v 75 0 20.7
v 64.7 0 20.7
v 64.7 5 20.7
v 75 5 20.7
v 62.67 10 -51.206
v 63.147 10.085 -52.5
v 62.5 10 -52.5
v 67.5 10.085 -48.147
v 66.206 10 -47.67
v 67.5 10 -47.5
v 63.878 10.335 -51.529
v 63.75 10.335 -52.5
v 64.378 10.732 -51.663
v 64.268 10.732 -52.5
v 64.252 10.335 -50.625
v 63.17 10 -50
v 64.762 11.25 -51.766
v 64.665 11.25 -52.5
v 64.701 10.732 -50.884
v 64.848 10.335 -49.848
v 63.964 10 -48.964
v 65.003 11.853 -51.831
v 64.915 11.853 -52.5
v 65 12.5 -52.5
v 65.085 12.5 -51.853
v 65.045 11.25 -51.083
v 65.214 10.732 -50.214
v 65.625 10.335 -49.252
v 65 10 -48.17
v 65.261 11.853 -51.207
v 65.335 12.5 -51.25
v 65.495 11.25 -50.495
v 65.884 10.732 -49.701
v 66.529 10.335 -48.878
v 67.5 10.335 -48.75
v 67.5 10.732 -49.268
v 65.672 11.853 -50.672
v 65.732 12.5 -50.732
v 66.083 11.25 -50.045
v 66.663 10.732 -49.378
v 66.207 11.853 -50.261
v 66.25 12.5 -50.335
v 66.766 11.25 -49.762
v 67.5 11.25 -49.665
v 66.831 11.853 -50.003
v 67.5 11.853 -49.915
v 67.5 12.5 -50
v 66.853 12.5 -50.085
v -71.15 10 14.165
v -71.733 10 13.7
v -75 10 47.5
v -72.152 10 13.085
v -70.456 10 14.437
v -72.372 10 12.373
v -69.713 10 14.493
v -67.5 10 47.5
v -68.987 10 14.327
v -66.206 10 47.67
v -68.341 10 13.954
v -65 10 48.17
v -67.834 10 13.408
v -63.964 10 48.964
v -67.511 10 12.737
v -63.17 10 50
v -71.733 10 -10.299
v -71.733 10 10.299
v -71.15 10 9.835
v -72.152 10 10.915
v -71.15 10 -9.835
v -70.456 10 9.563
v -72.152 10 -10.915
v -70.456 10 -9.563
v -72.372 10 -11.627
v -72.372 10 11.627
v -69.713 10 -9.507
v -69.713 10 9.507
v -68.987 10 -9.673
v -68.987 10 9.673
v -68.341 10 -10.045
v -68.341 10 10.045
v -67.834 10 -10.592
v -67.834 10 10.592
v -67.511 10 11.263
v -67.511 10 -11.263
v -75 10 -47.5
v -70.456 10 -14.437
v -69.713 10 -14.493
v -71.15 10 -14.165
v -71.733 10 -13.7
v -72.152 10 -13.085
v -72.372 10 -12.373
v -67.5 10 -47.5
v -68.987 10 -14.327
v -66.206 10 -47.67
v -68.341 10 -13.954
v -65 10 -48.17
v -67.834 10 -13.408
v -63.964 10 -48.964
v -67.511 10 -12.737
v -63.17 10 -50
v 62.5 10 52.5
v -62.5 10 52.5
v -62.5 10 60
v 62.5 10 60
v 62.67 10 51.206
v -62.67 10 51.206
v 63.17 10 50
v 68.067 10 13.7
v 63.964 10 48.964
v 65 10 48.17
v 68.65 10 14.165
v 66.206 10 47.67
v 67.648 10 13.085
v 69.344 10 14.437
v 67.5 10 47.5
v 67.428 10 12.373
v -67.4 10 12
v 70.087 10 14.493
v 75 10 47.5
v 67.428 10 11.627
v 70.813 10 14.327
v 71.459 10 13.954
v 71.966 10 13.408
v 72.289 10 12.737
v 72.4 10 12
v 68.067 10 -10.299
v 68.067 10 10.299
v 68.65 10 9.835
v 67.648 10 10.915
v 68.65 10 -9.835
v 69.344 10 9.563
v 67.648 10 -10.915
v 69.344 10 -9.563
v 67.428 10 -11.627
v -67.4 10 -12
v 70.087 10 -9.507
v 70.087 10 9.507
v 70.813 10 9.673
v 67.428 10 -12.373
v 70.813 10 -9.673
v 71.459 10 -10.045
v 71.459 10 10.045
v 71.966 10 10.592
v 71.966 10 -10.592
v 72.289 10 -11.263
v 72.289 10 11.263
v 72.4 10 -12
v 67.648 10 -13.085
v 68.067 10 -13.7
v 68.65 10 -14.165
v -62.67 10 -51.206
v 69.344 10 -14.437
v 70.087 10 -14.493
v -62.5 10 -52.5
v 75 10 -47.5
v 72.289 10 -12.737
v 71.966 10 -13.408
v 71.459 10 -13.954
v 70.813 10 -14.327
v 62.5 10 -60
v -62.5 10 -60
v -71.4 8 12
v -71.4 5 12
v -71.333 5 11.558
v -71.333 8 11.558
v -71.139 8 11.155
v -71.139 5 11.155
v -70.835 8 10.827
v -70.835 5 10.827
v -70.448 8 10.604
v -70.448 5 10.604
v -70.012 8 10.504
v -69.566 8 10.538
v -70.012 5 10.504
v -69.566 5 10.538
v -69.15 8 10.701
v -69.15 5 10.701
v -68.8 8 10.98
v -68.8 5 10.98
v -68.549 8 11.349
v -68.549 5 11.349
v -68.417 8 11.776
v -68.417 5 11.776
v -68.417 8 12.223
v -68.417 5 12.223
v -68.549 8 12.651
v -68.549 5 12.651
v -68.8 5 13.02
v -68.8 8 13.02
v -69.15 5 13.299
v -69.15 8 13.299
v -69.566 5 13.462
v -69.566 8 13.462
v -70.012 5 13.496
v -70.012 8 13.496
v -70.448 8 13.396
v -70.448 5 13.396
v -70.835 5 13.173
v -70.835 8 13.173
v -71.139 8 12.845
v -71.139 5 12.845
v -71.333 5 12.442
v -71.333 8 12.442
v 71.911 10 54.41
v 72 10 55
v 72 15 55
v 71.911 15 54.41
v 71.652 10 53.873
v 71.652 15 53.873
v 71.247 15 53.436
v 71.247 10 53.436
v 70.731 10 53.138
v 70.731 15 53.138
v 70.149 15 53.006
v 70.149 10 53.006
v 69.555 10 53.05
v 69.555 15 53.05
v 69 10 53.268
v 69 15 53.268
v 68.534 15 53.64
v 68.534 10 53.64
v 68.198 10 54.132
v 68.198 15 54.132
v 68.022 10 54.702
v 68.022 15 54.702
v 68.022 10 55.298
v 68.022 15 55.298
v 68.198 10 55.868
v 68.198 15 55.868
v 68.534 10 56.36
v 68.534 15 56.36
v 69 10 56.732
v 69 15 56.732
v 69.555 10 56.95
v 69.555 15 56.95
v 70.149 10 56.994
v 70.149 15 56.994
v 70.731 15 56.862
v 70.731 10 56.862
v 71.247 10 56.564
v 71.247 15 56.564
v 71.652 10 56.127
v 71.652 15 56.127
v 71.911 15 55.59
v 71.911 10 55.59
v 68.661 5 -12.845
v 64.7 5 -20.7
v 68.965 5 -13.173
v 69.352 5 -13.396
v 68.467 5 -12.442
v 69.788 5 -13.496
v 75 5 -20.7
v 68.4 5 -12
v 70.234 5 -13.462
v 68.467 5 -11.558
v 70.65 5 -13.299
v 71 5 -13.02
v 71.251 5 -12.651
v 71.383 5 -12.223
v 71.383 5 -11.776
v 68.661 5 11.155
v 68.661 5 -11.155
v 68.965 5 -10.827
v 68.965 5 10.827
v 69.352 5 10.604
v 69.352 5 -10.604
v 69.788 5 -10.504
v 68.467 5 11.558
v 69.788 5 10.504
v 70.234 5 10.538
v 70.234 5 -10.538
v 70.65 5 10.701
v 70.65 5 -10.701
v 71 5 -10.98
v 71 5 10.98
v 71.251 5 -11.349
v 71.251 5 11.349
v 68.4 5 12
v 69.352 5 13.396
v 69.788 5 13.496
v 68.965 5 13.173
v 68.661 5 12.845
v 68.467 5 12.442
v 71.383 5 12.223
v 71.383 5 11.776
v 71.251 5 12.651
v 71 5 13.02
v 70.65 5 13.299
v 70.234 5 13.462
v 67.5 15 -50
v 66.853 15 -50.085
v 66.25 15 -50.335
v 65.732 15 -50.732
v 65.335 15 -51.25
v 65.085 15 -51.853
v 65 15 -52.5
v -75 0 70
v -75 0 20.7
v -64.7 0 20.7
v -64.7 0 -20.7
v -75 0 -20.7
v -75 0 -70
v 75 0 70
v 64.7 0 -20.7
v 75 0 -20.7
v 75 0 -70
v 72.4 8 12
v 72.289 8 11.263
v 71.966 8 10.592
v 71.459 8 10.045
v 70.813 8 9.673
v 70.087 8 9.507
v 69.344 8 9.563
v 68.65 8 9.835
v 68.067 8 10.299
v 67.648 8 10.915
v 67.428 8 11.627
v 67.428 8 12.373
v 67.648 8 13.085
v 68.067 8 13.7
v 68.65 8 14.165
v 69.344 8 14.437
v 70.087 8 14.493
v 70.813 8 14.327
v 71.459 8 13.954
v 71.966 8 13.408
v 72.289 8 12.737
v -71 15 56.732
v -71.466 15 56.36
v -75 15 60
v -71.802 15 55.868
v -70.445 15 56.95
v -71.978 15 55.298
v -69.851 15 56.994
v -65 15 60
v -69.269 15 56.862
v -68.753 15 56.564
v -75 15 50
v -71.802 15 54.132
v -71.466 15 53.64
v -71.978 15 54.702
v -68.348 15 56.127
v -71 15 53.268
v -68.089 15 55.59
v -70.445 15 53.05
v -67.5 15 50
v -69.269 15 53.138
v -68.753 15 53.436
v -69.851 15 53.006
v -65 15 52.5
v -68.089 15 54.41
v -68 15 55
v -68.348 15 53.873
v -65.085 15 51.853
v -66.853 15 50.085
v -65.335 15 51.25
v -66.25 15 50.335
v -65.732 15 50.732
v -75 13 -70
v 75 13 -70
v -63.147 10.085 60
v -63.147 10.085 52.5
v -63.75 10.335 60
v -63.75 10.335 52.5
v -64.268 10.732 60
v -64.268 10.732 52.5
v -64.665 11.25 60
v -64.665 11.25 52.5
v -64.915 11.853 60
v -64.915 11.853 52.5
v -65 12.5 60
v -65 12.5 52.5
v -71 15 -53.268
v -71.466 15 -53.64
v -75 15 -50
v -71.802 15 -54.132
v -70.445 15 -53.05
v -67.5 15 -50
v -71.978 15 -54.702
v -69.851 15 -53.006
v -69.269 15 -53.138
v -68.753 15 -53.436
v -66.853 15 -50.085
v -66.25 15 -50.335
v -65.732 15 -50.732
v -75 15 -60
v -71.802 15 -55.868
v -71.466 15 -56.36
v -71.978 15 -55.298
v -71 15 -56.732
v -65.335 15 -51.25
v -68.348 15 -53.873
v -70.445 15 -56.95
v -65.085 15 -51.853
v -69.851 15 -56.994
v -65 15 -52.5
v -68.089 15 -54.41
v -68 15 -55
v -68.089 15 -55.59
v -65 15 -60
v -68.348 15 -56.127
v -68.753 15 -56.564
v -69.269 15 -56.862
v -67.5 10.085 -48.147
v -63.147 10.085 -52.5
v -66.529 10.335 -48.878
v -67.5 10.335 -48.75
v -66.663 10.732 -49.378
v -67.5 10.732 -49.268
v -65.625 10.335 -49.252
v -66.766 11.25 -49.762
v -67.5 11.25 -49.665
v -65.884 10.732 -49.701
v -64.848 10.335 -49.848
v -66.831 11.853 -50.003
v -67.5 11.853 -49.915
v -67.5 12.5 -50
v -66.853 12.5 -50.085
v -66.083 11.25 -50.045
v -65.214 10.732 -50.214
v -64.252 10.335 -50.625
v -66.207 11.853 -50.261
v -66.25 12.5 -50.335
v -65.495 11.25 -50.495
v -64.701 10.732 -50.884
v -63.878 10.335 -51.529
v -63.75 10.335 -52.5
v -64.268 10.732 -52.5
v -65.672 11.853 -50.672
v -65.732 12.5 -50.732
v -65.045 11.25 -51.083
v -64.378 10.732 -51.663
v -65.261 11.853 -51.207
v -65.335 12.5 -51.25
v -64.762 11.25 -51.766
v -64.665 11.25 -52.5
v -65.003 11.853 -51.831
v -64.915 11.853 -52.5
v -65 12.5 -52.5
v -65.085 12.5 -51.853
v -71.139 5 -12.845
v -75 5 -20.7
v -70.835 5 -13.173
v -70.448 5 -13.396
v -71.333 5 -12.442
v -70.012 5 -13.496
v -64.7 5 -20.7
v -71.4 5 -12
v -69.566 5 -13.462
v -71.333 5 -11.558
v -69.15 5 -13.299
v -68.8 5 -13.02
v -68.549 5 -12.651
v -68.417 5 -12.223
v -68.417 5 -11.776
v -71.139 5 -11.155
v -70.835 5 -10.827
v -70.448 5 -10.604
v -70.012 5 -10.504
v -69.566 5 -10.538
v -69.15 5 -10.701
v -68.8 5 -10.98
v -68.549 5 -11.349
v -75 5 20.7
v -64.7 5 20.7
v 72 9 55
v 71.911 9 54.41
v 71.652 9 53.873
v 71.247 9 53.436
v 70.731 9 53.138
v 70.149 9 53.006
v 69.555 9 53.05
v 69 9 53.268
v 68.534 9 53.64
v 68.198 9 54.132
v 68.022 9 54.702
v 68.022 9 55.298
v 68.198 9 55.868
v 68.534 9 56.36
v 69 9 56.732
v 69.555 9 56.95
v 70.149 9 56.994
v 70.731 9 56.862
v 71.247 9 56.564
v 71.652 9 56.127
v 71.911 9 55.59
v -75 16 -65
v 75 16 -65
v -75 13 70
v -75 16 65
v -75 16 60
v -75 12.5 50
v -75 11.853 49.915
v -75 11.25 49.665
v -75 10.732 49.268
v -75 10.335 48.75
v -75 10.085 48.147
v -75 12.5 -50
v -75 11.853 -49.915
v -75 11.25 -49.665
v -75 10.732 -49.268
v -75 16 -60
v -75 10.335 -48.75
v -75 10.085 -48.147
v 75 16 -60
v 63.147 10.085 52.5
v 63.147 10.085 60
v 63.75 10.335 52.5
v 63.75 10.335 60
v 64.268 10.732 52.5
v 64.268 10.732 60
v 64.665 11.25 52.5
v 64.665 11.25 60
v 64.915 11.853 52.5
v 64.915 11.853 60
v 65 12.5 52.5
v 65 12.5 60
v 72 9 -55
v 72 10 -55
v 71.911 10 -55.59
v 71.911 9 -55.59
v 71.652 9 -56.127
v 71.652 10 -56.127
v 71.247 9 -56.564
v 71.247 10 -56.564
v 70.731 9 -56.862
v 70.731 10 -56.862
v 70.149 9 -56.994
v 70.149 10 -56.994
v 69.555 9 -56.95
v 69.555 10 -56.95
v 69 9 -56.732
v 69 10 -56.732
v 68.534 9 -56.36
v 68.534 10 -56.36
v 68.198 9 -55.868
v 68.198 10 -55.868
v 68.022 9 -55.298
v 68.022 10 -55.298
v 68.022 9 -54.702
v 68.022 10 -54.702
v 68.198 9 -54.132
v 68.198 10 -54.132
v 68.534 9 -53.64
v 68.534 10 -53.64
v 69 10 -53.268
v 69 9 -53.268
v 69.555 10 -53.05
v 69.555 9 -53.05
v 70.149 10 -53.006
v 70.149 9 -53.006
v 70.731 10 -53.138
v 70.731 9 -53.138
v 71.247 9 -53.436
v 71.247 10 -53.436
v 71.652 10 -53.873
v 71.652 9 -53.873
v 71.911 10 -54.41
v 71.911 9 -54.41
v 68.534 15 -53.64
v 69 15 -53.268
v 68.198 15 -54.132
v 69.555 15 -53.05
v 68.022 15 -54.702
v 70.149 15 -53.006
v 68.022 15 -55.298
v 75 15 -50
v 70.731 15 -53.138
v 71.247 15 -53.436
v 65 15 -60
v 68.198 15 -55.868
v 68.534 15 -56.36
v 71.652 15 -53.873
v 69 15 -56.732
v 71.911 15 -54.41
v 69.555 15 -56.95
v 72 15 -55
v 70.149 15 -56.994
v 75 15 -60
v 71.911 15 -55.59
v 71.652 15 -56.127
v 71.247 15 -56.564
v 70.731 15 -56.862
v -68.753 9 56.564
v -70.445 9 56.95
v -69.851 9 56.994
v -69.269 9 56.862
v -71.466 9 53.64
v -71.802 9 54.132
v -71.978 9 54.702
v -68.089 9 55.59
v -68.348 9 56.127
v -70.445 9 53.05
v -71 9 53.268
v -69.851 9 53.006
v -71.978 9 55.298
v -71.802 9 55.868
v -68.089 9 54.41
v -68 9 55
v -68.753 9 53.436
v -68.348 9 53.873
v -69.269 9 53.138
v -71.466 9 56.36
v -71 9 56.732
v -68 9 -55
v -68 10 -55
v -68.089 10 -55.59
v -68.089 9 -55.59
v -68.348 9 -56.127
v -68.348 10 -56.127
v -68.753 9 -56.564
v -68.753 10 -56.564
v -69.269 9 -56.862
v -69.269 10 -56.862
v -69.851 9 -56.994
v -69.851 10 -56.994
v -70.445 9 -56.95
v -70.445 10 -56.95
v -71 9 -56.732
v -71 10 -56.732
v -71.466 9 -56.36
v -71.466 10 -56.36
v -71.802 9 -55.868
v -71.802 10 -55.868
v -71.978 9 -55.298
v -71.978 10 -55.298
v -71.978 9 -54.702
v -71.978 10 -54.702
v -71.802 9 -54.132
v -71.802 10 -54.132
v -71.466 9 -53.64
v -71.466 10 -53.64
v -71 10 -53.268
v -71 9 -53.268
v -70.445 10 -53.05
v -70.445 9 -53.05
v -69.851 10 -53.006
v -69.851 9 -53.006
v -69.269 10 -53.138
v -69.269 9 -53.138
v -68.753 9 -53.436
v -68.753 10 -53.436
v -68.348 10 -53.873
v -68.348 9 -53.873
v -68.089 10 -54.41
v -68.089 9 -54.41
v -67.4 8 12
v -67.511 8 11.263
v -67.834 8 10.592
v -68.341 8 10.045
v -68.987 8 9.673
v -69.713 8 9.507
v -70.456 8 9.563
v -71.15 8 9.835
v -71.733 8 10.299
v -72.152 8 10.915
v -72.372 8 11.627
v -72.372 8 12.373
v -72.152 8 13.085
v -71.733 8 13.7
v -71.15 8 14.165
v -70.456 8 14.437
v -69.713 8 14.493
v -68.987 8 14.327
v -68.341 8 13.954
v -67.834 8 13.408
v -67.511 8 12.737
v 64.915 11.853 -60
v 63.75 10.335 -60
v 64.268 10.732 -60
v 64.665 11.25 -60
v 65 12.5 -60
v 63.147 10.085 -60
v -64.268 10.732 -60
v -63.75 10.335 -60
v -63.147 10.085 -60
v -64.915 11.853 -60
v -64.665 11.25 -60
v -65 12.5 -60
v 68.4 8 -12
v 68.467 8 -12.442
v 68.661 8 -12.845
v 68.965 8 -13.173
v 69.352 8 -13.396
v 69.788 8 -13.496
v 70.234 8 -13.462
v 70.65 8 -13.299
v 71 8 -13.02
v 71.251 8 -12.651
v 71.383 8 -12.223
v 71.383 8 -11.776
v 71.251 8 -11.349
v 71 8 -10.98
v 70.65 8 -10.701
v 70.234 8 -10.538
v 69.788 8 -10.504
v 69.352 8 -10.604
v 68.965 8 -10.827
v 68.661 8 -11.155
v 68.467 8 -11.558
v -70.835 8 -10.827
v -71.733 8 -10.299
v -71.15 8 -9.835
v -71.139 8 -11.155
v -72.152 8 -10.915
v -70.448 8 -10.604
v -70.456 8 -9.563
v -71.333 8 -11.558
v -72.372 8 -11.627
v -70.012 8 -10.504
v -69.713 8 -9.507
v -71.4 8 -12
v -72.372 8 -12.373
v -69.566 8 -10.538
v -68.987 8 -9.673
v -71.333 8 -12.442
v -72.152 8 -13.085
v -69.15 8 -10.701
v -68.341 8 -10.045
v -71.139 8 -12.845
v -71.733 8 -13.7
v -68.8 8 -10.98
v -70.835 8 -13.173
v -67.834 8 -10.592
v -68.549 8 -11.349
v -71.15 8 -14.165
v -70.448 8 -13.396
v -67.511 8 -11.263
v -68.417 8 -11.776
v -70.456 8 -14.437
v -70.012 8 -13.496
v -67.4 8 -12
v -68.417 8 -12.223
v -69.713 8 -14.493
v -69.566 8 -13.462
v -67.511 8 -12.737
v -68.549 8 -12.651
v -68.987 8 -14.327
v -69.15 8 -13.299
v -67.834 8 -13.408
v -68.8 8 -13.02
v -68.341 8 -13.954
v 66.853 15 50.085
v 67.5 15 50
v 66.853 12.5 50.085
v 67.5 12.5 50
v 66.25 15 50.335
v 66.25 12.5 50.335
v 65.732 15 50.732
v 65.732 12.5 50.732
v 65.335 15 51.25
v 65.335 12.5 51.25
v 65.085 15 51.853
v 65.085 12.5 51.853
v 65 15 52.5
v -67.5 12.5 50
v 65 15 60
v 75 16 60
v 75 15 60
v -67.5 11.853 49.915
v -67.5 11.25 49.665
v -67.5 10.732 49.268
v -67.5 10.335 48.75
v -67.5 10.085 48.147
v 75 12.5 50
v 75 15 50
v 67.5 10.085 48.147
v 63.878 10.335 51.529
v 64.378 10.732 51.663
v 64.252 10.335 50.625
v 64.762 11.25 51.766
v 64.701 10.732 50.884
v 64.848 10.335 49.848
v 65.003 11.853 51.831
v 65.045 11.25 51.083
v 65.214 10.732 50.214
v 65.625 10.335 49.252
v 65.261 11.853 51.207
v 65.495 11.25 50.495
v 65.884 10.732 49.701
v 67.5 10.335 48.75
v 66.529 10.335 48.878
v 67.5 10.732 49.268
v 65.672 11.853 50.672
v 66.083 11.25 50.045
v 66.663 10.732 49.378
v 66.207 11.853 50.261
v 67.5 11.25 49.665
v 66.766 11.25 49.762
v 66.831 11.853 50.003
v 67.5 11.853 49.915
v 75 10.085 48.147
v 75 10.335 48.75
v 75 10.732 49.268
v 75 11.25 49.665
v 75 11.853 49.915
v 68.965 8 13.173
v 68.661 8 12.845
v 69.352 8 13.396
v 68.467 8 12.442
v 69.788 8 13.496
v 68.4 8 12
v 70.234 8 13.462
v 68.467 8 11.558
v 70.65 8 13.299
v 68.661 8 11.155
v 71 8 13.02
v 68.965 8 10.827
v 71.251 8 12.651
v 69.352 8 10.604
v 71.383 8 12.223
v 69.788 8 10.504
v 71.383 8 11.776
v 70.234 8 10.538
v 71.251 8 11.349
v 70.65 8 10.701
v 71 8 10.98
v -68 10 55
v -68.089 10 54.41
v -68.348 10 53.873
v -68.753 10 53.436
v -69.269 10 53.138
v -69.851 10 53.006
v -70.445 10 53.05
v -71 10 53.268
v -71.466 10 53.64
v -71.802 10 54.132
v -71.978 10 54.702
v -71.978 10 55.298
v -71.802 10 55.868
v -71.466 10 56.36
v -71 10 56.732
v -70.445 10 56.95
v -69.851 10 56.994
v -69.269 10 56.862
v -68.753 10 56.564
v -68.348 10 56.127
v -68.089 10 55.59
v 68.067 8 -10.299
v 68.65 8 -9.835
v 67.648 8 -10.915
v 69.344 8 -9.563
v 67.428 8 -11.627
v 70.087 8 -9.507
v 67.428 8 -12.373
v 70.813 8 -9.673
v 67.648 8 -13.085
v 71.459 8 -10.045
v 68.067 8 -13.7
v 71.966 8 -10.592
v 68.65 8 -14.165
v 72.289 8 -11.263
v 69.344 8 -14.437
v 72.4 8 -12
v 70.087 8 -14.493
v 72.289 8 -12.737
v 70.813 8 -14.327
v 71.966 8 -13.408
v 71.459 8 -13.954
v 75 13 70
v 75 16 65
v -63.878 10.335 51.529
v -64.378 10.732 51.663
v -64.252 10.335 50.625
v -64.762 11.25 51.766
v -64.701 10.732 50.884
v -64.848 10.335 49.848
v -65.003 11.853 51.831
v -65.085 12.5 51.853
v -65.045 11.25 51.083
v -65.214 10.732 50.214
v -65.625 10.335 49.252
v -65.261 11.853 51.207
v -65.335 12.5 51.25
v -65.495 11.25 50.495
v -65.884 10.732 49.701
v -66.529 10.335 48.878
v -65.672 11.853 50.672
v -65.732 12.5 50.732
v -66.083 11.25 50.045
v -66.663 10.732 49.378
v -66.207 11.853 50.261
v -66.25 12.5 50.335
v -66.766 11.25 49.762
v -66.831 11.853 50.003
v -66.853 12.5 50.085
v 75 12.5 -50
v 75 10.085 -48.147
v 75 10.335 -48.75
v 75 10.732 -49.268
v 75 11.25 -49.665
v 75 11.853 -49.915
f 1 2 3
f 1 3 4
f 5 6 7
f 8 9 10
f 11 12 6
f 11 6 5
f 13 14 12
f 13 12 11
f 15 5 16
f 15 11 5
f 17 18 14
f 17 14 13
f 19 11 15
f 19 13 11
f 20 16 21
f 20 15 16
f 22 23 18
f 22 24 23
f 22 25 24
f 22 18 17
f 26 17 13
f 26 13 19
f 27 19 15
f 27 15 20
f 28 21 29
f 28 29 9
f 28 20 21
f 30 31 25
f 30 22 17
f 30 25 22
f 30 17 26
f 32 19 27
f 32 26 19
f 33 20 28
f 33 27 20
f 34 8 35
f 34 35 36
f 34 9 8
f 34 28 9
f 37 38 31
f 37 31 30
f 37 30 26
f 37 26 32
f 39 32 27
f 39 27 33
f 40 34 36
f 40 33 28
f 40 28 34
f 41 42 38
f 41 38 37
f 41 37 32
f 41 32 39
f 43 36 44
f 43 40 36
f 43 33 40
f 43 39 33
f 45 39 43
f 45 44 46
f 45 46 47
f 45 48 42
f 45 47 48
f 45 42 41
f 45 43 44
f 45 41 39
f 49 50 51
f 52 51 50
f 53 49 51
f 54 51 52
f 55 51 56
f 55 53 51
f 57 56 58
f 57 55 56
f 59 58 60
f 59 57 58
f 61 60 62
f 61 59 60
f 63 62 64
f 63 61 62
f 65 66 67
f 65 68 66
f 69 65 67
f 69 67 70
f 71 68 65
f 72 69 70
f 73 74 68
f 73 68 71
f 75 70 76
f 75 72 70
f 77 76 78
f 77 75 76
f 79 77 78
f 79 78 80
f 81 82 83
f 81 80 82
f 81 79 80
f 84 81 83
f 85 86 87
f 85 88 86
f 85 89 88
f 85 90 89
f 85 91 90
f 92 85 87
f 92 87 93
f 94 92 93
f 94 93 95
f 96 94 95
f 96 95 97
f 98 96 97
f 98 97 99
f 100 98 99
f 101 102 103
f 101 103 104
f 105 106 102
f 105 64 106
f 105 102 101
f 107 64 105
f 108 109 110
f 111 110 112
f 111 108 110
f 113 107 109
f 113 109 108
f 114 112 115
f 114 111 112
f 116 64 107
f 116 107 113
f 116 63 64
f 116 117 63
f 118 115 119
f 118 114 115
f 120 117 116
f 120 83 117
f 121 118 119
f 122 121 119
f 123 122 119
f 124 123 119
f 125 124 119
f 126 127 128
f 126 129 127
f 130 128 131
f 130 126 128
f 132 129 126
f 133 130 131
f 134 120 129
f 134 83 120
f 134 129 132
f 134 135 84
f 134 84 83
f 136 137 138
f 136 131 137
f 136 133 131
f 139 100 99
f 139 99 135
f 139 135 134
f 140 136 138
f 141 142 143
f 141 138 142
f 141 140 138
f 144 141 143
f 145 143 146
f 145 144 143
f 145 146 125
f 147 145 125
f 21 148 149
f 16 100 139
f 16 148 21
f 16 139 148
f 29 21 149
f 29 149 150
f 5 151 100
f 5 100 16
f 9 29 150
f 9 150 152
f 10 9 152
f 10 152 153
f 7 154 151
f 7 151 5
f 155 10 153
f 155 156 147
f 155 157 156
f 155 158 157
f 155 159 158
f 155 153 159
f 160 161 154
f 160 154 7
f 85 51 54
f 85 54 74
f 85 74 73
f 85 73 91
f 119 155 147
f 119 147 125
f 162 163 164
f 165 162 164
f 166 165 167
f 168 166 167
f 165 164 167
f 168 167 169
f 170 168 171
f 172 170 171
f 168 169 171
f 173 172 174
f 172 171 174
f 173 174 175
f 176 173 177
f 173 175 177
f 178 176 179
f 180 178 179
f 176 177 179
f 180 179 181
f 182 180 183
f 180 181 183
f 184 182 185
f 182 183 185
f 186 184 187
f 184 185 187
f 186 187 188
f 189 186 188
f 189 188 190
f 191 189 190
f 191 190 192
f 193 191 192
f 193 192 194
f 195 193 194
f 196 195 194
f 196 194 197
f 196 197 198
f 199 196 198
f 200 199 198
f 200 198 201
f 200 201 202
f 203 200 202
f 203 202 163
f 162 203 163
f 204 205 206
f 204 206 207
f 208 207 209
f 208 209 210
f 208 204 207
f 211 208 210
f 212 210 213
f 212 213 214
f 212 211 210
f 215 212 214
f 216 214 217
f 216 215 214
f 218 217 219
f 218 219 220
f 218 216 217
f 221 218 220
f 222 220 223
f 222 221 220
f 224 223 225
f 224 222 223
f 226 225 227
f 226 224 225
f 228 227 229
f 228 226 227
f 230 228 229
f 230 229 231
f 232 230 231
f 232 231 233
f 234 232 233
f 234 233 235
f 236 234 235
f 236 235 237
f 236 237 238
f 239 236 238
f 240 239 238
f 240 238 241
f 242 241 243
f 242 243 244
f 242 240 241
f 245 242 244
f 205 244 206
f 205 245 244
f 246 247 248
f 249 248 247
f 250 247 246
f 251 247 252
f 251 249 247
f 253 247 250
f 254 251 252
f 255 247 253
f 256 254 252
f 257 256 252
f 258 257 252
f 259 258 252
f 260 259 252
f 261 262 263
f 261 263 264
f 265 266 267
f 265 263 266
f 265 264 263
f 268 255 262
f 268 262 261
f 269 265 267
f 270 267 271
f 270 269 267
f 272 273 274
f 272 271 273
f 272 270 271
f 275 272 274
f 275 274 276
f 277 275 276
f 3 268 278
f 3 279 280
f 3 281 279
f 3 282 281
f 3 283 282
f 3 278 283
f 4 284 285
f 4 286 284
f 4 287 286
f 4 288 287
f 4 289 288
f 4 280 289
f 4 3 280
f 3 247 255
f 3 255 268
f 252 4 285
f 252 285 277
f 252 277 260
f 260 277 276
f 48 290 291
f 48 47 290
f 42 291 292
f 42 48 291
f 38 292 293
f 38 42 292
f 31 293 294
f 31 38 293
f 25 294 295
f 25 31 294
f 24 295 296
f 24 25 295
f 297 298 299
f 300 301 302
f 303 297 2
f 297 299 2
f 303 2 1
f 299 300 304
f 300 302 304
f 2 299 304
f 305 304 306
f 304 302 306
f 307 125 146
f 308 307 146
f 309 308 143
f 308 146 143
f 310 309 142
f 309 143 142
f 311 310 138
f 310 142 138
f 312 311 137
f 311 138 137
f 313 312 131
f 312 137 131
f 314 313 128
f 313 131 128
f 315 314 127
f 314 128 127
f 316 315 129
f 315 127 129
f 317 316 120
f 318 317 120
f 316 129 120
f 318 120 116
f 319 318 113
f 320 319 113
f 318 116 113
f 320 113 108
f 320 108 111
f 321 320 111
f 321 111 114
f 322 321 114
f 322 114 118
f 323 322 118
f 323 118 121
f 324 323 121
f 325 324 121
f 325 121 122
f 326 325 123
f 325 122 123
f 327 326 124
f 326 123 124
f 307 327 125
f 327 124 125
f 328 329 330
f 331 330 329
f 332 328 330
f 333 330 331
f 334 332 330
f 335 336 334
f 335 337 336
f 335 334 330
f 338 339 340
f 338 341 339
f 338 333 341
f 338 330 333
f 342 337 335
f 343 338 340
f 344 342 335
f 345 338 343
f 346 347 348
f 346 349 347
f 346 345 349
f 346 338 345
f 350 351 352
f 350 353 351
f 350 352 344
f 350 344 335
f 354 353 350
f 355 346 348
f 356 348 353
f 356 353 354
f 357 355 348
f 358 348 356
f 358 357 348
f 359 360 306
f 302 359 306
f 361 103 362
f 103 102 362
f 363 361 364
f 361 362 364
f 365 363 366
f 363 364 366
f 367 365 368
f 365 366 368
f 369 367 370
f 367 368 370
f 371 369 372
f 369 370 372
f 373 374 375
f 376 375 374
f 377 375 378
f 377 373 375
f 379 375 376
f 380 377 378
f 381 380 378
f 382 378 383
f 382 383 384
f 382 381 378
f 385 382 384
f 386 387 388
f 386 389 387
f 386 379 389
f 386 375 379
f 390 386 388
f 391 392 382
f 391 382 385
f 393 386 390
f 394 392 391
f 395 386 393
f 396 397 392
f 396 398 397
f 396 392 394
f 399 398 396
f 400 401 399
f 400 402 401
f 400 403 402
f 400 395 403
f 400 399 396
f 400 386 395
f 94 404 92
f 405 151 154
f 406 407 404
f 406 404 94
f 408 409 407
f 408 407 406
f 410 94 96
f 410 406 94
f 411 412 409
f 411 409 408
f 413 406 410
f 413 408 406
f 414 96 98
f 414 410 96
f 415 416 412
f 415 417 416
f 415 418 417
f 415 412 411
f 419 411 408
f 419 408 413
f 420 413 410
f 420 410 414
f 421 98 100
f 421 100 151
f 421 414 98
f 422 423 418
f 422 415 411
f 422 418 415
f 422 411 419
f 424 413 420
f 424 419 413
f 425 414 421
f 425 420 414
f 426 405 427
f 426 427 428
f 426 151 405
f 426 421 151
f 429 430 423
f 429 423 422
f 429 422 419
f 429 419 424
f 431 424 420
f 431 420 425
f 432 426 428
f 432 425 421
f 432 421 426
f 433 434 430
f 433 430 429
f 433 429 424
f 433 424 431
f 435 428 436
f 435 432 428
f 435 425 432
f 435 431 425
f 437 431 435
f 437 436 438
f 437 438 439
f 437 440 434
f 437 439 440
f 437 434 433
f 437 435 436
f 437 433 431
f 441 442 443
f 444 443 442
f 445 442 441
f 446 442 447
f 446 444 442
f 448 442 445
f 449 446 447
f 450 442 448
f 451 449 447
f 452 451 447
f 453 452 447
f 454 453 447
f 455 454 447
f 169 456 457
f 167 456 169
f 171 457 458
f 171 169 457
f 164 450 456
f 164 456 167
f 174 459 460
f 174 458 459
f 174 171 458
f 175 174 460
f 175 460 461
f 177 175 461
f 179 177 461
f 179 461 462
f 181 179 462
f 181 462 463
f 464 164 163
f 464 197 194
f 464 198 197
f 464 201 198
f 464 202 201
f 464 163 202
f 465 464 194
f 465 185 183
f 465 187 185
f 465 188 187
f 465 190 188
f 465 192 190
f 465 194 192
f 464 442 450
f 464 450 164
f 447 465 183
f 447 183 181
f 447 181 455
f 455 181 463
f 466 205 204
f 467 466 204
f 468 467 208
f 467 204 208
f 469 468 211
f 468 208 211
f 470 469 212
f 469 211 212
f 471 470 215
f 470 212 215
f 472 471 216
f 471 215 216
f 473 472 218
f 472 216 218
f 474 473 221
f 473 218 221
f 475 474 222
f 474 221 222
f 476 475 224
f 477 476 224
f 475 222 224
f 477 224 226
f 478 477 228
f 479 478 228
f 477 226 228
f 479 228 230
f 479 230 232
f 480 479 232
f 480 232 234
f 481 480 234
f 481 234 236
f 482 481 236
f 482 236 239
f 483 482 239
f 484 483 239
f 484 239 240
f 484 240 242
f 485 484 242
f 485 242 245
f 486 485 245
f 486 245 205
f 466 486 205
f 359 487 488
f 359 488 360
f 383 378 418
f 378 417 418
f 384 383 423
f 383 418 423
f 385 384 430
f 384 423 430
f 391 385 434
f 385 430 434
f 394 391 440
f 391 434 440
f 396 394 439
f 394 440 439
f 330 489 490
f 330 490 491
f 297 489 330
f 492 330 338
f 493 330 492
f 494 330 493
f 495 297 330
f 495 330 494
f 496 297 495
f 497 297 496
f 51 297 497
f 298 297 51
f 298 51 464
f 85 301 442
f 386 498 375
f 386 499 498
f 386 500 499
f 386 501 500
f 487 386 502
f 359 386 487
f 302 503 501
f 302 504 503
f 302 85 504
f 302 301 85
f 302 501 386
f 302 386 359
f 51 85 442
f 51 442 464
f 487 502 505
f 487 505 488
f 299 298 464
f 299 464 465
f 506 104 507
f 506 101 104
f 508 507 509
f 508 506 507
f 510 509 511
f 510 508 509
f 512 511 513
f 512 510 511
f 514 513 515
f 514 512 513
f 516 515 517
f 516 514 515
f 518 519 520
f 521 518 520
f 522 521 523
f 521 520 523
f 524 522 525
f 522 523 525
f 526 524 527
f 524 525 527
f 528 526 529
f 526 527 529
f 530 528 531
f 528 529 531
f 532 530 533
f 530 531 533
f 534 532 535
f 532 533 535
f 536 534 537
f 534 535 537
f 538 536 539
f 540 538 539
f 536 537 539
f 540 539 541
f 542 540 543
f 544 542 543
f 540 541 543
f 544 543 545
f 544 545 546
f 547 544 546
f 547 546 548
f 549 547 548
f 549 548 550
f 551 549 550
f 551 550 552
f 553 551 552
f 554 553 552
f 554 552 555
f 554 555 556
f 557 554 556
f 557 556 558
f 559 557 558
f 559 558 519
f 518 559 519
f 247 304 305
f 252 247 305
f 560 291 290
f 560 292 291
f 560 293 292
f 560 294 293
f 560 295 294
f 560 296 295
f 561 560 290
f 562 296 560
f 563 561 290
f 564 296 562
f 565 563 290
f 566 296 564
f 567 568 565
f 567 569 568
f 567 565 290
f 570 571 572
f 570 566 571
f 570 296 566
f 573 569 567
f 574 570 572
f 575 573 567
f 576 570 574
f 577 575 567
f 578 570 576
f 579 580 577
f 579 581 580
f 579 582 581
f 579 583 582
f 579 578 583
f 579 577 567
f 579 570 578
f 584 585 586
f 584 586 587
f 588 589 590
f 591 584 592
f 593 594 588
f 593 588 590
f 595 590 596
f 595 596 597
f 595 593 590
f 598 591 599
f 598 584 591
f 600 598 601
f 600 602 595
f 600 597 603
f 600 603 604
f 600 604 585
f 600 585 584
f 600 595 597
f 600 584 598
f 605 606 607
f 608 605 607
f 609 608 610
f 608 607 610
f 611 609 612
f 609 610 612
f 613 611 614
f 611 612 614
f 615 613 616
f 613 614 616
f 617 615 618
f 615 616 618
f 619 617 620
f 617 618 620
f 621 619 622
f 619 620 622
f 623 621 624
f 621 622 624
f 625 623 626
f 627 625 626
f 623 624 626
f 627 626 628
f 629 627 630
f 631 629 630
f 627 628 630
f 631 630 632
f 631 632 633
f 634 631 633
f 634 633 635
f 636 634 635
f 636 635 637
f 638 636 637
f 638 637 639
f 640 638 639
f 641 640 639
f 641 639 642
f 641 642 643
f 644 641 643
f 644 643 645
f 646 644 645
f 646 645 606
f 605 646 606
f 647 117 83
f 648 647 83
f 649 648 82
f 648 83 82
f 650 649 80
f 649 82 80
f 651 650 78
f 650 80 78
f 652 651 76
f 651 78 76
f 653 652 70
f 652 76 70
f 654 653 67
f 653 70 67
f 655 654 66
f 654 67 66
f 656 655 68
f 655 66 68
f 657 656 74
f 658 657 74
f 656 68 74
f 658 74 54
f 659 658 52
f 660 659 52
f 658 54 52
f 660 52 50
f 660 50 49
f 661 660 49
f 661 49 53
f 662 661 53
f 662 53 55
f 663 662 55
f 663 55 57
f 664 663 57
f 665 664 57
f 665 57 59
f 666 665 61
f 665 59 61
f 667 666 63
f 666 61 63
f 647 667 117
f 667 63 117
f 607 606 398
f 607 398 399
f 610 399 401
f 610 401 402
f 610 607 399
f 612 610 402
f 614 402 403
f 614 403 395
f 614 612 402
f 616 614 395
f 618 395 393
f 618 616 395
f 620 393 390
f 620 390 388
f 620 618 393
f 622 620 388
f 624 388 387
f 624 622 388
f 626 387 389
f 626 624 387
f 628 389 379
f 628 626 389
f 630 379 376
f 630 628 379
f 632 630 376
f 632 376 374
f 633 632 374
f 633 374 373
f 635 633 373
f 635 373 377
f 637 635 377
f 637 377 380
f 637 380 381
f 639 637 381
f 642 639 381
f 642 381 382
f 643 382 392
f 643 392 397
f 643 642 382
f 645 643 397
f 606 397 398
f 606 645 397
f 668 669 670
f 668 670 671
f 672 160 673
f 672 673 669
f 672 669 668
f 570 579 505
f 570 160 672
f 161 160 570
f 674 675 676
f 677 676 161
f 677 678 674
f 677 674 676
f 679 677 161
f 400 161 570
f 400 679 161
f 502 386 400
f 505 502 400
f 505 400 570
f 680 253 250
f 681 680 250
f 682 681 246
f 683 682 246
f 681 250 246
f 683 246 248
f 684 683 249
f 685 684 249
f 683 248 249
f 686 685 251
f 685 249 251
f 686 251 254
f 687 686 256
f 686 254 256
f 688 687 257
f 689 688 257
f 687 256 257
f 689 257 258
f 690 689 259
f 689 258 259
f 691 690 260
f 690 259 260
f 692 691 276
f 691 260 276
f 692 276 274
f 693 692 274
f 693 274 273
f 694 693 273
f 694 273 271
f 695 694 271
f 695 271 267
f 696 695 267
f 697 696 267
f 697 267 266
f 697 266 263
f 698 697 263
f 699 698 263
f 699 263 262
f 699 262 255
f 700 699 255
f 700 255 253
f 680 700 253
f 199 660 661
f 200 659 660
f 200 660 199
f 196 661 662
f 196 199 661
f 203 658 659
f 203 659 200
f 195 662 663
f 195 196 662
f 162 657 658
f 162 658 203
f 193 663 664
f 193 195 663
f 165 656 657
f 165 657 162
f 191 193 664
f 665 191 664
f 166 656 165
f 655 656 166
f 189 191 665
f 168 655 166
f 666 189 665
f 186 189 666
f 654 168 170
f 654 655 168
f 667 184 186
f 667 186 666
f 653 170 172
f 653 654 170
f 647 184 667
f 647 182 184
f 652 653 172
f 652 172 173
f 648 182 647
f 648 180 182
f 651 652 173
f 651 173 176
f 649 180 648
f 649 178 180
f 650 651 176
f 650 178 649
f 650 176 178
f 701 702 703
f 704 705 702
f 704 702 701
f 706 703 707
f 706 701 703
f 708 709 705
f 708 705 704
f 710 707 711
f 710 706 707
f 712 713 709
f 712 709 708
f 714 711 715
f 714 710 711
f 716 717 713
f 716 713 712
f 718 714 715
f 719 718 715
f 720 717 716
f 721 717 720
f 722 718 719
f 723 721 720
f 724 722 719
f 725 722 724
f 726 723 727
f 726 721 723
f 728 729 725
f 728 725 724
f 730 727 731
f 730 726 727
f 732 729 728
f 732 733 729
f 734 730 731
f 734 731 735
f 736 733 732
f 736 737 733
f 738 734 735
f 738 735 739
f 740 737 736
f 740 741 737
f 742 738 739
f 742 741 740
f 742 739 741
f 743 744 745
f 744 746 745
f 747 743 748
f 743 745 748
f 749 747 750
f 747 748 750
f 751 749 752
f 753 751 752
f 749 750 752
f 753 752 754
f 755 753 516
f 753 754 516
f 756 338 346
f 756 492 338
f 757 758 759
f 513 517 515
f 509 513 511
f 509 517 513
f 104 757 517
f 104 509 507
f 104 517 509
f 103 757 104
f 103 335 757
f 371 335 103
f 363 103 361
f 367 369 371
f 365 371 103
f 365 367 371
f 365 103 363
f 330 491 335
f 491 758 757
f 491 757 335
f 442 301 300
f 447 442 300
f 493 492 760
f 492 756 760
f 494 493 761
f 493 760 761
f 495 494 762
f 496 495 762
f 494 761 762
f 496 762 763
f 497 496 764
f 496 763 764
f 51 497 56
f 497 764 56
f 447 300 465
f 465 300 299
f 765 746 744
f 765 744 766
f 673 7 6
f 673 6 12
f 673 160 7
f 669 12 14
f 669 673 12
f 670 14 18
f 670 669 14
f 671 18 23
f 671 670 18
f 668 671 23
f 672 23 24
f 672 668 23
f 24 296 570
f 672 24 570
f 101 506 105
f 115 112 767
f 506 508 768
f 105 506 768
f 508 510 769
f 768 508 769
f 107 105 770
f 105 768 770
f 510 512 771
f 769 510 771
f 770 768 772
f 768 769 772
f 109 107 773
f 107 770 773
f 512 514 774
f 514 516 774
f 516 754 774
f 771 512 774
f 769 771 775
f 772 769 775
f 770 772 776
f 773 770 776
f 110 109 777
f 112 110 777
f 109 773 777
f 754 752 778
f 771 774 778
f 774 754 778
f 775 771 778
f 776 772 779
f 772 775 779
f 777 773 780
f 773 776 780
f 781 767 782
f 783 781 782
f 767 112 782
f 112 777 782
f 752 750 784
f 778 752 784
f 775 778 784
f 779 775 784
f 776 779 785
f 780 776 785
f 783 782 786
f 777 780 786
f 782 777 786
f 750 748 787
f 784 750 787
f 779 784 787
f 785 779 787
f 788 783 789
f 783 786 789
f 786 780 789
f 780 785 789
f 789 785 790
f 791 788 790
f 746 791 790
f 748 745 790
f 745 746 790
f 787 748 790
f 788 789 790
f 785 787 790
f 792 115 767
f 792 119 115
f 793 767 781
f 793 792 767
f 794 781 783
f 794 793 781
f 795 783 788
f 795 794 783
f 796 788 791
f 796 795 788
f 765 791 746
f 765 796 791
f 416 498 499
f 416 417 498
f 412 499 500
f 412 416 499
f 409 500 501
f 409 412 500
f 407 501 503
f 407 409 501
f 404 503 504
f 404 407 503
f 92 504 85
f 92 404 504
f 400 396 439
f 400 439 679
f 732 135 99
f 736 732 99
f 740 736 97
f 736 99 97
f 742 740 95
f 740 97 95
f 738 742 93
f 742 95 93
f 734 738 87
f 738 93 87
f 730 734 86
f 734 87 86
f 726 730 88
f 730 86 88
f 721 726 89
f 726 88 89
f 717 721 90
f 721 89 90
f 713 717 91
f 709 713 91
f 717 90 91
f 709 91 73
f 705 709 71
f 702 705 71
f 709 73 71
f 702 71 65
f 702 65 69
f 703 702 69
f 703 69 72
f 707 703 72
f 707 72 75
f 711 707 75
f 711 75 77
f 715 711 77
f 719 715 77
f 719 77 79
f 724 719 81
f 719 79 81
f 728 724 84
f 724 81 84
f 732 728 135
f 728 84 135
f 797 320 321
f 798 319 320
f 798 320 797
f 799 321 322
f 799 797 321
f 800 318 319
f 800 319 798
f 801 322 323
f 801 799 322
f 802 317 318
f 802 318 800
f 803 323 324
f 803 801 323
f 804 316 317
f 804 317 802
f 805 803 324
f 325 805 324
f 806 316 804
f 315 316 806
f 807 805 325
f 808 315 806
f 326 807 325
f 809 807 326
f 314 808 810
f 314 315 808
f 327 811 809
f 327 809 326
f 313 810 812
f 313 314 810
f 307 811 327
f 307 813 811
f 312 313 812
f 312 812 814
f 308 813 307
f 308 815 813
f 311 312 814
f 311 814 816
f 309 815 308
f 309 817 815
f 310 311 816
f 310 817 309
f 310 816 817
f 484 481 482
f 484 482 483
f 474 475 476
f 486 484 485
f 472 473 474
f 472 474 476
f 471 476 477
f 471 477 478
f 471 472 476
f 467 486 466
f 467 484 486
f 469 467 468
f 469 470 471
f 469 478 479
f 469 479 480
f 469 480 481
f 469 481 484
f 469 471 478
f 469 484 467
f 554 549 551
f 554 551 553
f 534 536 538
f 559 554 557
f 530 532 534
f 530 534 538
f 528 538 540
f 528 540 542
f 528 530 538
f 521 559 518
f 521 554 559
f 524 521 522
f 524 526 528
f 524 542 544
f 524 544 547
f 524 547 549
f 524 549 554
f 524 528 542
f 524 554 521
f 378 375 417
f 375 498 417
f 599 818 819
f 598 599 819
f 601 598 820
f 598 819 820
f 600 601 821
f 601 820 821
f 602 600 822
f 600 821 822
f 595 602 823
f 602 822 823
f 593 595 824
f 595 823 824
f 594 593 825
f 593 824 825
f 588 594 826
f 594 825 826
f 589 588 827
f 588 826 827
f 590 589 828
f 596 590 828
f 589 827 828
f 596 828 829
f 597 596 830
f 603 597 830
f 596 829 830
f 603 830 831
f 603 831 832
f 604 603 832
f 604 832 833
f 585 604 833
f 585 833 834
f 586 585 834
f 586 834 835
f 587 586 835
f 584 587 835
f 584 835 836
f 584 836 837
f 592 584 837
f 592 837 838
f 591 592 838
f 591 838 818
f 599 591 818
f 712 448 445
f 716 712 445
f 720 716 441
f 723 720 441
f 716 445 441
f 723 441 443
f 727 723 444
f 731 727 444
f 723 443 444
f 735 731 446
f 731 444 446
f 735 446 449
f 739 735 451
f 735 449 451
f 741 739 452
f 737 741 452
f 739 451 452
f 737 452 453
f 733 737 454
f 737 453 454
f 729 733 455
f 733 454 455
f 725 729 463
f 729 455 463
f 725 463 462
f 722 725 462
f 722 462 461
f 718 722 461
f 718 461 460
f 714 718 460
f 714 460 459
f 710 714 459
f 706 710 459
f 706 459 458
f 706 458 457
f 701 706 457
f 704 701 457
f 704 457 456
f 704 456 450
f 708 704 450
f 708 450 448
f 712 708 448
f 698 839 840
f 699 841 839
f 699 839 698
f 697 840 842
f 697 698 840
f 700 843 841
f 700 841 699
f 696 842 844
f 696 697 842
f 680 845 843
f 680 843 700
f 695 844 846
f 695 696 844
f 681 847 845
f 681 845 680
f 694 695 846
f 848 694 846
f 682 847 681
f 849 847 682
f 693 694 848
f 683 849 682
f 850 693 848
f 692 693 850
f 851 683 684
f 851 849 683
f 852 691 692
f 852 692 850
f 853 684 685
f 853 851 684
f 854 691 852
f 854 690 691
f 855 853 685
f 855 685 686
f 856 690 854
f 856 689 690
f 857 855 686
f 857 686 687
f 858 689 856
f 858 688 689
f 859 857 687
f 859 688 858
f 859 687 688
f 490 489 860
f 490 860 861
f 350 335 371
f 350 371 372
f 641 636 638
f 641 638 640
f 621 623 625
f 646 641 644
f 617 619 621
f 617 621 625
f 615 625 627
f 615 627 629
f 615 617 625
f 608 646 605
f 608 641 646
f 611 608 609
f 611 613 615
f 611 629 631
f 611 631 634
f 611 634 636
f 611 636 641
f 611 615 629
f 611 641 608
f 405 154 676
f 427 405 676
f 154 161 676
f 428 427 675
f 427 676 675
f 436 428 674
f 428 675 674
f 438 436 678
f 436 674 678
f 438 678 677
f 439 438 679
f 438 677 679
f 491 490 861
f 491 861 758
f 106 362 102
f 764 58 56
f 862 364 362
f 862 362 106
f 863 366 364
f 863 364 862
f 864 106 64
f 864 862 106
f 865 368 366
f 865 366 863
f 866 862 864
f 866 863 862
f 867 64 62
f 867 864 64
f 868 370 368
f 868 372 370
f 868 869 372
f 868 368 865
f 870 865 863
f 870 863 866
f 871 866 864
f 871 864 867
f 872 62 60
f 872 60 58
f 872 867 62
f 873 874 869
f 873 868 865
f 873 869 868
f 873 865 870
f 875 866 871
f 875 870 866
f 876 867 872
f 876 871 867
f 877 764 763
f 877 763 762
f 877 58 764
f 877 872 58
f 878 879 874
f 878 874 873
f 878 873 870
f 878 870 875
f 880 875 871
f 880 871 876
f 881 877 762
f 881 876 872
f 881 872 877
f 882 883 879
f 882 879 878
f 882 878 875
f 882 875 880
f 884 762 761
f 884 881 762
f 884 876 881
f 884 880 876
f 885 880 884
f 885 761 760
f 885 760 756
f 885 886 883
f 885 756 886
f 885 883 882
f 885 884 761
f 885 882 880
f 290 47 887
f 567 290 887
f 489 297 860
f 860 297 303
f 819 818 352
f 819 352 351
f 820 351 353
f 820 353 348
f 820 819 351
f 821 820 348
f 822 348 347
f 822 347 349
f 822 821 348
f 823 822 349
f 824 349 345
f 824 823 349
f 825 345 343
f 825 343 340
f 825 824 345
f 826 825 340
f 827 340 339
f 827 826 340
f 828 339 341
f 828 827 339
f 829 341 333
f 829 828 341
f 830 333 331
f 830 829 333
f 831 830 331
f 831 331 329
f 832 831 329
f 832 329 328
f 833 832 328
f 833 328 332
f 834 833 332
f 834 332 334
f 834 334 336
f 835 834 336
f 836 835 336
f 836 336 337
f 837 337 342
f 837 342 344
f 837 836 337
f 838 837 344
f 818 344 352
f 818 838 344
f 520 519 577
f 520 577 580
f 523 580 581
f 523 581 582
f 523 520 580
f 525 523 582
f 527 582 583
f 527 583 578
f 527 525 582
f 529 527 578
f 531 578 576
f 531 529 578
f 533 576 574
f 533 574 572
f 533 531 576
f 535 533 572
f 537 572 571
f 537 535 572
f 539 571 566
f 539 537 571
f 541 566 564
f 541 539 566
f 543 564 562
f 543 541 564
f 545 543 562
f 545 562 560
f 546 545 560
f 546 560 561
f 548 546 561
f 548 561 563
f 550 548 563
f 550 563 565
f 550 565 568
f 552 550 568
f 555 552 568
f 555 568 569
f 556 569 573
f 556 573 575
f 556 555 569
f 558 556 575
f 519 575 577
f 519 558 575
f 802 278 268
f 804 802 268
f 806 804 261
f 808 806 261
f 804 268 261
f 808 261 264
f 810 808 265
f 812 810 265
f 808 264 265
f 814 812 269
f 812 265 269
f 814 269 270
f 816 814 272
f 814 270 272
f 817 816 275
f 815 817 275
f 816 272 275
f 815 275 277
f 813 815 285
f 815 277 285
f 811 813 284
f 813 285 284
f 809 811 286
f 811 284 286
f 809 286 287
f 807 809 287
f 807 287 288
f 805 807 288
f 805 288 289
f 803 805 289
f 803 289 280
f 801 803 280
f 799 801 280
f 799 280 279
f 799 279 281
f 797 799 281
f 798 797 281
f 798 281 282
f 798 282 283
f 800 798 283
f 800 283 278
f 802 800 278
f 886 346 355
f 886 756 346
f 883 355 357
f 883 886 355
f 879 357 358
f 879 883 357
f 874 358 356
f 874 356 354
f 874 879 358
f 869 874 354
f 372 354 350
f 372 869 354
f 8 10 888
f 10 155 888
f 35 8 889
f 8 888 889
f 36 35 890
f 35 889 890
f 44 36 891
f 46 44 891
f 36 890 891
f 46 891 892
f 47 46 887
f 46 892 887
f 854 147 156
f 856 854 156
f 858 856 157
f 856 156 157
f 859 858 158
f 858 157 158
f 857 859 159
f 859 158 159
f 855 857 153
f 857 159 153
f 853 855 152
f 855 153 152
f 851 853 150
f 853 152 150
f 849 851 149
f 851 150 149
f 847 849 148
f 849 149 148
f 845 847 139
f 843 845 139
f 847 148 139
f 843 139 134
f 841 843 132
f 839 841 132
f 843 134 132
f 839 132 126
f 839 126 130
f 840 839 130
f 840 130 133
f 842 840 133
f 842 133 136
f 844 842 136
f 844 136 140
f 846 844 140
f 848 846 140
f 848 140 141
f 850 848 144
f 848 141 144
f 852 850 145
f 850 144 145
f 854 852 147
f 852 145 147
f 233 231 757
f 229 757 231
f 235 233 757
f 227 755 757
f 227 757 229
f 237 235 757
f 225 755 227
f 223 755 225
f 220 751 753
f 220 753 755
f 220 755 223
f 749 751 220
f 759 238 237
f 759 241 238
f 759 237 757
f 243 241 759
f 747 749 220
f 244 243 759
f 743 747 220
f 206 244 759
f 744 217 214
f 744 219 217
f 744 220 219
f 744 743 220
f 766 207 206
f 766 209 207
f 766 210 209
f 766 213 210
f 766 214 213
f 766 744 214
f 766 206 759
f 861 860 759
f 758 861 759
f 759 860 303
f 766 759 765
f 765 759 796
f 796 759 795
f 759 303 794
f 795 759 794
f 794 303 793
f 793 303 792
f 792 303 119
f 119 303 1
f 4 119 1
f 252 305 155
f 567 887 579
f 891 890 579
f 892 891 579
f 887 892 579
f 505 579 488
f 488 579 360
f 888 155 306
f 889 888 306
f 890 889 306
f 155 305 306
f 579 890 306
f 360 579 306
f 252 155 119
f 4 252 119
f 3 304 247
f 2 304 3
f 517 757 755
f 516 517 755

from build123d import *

# Parameters (mm, degrees)
SKETCH1_W           = 150
SKETCH1_H           = 140
BOSS_EXTRUDE1_DEPTH = 10
SKETCH2_W           = 10.4
SKETCH2_H           = 41.4
CUT_EXTRUDE1_DEPTH  = 5
BOSS_EXTRUDE2_DEPTH = 150
SKETCH4_W           = 150
SKETCH4_H           = 10
SKETCH4_R           = 2
BOSS_EXTRUDE3_DEPTH = 5
SKETCH5_R           = 2
CUT_EXTRUDE2_DEPTH  = 6
SKETCH6_R           = 1.5
CUT_EXTRUDE3_DEPTH  = 5
SKETCH7_R           = 2.5
CUT_EXTRUDE4_DEPTH  = 2
SKETCH8_W           = 130
SKETCH8_H           = 120
CUT_EXTRUDE5_DEPTH  = 5
FILLET1_R           = 2.5


with BuildPart() as part:
    # Sketch1 → Boss-Extrude1 (new body)
    with BuildSketch(Plane(origin=(0, 0, 0), x_dir=(1, 0, 0), z_dir=(0, 1, 0))):
        Rectangle(SKETCH1_W, SKETCH1_H)
    extrude(amount=BOSS_EXTRUDE1_DEPTH)

    # Sketch2 → Cut-Extrude1 (cut)
    with BuildSketch(Plane.XZ):
        with Locations((-69.9, 0)):
            Rectangle(SKETCH2_W, SKETCH2_H)
        with Locations((69.9, 0)):
            Rectangle(SKETCH2_W, SKETCH2_H)
    extrude(amount=-CUT_EXTRUDE1_DEPTH, mode=Mode.SUBTRACT)

    # Sketch3 → Boss-Extrude2 (add)
    with BuildSketch(Plane.ZY.offset(75)):
        Polygon((-70, 13), (-70, 10), (-60, 10), (-60, 16), (-65, 16), align=None)
        Polygon((70, 10), (70, 13), (65, 16), (60, 16), (60, 10), align=None)
    extrude(amount=-BOSS_EXTRUDE2_DEPTH)

    # Sketch4 → Boss-Extrude3 (add)
    with BuildSketch(Plane(origin=(0, 10, 0), x_dir=(1, 0, 0), z_dir=(0, 1, 0))):
        with Locations((0, 55)):
            Rectangle(SKETCH4_W, SKETCH4_H)
        with Locations((-70, 55)):
            Circle(SKETCH4_R, mode=Mode.SUBTRACT)
        with Locations((70, 55)):
            Circle(SKETCH4_R, mode=Mode.SUBTRACT)
        with Locations((0, -55)):
            Rectangle(SKETCH4_W, SKETCH4_H)
        with Locations((70, -55)):
            Circle(SKETCH4_R, mode=Mode.SUBTRACT)
        with Locations((-70, -55)):
            Circle(SKETCH4_R, mode=Mode.SUBTRACT)
    extrude(amount=BOSS_EXTRUDE3_DEPTH)

    # Sketch5 → Cut-Extrude2 (cut)
    with BuildSketch(Plane(origin=(0, 15, 0), x_dir=(1, 0, 0), z_dir=(0, 1, 0))):
        with Locations((-70, 55)):
            Circle(SKETCH5_R)
        with Locations((70, 55)):
            Circle(SKETCH5_R)
        with Locations((-70, -55)):
            Circle(SKETCH5_R)
        with Locations((70, -55)):
            Circle(SKETCH5_R)
    extrude(amount=-CUT_EXTRUDE2_DEPTH, mode=Mode.SUBTRACT)

    # Sketch6 → Cut-Extrude3 (cut)
    with BuildSketch(Plane(origin=(0, 5, 0), x_dir=(-1, 0, 0), z_dir=(0, -1, 0))):
        with Locations((69.899999566, -11.999895835)):
            Circle(SKETCH6_R)
        with Locations((69.899999566, 11.999895835)):
            Circle(SKETCH6_R)
        with Locations((-69.899999566, -11.999895835)):
            Circle(SKETCH6_R)
        with Locations((-69.899999566, 11.999895835)):
            Circle(SKETCH6_R)
    extrude(amount=-CUT_EXTRUDE3_DEPTH, mode=Mode.SUBTRACT)

    # Sketch7 → Cut-Extrude4 (cut)
    with BuildSketch(Plane(origin=(0, 10, 0), x_dir=(1, 0, 0), z_dir=(0, 1, 0))):
        with Locations((-69.899999566, 11.999895835)):
            Circle(SKETCH7_R)
        with Locations((-69.899999566, -11.999895835)):
            Circle(SKETCH7_R)
        with Locations((69.899999566, -11.999895835)):
            Circle(SKETCH7_R)
        with Locations((69.899999566, 11.999895835)):
            Circle(SKETCH7_R)
    extrude(amount=-CUT_EXTRUDE4_DEPTH, mode=Mode.SUBTRACT)

    # Sketch8 → Cut-Extrude5 (cut)
    with BuildSketch(Plane(origin=(0, 15, 0), x_dir=(1, 0, 0), z_dir=(0, 1, 0))):
        Rectangle(SKETCH8_W, SKETCH8_H)
    extrude(amount=-CUT_EXTRUDE5_DEPTH, mode=Mode.SUBTRACT)

    # Fillet1
    fillet1_edges = [part.edges().sort_by_distance(p)[0] for p in [
        (-70, 10, 50),
        (70, 10, 50),
        (70, 10, -50),
        (65, 12.5, -50),
        (65, 10, -55),
        (65, 12.5, 50),
        (-65, 10, -55),
        (-65, 12.5, -50),
        (-65, 12.5, 50),
        (65, 10, 55),
        (-65, 10, 55),
        (-70, 10, -50),
    ]]
    fillet(fillet1_edges, radius=FILLET1_R)


solid = part.part
